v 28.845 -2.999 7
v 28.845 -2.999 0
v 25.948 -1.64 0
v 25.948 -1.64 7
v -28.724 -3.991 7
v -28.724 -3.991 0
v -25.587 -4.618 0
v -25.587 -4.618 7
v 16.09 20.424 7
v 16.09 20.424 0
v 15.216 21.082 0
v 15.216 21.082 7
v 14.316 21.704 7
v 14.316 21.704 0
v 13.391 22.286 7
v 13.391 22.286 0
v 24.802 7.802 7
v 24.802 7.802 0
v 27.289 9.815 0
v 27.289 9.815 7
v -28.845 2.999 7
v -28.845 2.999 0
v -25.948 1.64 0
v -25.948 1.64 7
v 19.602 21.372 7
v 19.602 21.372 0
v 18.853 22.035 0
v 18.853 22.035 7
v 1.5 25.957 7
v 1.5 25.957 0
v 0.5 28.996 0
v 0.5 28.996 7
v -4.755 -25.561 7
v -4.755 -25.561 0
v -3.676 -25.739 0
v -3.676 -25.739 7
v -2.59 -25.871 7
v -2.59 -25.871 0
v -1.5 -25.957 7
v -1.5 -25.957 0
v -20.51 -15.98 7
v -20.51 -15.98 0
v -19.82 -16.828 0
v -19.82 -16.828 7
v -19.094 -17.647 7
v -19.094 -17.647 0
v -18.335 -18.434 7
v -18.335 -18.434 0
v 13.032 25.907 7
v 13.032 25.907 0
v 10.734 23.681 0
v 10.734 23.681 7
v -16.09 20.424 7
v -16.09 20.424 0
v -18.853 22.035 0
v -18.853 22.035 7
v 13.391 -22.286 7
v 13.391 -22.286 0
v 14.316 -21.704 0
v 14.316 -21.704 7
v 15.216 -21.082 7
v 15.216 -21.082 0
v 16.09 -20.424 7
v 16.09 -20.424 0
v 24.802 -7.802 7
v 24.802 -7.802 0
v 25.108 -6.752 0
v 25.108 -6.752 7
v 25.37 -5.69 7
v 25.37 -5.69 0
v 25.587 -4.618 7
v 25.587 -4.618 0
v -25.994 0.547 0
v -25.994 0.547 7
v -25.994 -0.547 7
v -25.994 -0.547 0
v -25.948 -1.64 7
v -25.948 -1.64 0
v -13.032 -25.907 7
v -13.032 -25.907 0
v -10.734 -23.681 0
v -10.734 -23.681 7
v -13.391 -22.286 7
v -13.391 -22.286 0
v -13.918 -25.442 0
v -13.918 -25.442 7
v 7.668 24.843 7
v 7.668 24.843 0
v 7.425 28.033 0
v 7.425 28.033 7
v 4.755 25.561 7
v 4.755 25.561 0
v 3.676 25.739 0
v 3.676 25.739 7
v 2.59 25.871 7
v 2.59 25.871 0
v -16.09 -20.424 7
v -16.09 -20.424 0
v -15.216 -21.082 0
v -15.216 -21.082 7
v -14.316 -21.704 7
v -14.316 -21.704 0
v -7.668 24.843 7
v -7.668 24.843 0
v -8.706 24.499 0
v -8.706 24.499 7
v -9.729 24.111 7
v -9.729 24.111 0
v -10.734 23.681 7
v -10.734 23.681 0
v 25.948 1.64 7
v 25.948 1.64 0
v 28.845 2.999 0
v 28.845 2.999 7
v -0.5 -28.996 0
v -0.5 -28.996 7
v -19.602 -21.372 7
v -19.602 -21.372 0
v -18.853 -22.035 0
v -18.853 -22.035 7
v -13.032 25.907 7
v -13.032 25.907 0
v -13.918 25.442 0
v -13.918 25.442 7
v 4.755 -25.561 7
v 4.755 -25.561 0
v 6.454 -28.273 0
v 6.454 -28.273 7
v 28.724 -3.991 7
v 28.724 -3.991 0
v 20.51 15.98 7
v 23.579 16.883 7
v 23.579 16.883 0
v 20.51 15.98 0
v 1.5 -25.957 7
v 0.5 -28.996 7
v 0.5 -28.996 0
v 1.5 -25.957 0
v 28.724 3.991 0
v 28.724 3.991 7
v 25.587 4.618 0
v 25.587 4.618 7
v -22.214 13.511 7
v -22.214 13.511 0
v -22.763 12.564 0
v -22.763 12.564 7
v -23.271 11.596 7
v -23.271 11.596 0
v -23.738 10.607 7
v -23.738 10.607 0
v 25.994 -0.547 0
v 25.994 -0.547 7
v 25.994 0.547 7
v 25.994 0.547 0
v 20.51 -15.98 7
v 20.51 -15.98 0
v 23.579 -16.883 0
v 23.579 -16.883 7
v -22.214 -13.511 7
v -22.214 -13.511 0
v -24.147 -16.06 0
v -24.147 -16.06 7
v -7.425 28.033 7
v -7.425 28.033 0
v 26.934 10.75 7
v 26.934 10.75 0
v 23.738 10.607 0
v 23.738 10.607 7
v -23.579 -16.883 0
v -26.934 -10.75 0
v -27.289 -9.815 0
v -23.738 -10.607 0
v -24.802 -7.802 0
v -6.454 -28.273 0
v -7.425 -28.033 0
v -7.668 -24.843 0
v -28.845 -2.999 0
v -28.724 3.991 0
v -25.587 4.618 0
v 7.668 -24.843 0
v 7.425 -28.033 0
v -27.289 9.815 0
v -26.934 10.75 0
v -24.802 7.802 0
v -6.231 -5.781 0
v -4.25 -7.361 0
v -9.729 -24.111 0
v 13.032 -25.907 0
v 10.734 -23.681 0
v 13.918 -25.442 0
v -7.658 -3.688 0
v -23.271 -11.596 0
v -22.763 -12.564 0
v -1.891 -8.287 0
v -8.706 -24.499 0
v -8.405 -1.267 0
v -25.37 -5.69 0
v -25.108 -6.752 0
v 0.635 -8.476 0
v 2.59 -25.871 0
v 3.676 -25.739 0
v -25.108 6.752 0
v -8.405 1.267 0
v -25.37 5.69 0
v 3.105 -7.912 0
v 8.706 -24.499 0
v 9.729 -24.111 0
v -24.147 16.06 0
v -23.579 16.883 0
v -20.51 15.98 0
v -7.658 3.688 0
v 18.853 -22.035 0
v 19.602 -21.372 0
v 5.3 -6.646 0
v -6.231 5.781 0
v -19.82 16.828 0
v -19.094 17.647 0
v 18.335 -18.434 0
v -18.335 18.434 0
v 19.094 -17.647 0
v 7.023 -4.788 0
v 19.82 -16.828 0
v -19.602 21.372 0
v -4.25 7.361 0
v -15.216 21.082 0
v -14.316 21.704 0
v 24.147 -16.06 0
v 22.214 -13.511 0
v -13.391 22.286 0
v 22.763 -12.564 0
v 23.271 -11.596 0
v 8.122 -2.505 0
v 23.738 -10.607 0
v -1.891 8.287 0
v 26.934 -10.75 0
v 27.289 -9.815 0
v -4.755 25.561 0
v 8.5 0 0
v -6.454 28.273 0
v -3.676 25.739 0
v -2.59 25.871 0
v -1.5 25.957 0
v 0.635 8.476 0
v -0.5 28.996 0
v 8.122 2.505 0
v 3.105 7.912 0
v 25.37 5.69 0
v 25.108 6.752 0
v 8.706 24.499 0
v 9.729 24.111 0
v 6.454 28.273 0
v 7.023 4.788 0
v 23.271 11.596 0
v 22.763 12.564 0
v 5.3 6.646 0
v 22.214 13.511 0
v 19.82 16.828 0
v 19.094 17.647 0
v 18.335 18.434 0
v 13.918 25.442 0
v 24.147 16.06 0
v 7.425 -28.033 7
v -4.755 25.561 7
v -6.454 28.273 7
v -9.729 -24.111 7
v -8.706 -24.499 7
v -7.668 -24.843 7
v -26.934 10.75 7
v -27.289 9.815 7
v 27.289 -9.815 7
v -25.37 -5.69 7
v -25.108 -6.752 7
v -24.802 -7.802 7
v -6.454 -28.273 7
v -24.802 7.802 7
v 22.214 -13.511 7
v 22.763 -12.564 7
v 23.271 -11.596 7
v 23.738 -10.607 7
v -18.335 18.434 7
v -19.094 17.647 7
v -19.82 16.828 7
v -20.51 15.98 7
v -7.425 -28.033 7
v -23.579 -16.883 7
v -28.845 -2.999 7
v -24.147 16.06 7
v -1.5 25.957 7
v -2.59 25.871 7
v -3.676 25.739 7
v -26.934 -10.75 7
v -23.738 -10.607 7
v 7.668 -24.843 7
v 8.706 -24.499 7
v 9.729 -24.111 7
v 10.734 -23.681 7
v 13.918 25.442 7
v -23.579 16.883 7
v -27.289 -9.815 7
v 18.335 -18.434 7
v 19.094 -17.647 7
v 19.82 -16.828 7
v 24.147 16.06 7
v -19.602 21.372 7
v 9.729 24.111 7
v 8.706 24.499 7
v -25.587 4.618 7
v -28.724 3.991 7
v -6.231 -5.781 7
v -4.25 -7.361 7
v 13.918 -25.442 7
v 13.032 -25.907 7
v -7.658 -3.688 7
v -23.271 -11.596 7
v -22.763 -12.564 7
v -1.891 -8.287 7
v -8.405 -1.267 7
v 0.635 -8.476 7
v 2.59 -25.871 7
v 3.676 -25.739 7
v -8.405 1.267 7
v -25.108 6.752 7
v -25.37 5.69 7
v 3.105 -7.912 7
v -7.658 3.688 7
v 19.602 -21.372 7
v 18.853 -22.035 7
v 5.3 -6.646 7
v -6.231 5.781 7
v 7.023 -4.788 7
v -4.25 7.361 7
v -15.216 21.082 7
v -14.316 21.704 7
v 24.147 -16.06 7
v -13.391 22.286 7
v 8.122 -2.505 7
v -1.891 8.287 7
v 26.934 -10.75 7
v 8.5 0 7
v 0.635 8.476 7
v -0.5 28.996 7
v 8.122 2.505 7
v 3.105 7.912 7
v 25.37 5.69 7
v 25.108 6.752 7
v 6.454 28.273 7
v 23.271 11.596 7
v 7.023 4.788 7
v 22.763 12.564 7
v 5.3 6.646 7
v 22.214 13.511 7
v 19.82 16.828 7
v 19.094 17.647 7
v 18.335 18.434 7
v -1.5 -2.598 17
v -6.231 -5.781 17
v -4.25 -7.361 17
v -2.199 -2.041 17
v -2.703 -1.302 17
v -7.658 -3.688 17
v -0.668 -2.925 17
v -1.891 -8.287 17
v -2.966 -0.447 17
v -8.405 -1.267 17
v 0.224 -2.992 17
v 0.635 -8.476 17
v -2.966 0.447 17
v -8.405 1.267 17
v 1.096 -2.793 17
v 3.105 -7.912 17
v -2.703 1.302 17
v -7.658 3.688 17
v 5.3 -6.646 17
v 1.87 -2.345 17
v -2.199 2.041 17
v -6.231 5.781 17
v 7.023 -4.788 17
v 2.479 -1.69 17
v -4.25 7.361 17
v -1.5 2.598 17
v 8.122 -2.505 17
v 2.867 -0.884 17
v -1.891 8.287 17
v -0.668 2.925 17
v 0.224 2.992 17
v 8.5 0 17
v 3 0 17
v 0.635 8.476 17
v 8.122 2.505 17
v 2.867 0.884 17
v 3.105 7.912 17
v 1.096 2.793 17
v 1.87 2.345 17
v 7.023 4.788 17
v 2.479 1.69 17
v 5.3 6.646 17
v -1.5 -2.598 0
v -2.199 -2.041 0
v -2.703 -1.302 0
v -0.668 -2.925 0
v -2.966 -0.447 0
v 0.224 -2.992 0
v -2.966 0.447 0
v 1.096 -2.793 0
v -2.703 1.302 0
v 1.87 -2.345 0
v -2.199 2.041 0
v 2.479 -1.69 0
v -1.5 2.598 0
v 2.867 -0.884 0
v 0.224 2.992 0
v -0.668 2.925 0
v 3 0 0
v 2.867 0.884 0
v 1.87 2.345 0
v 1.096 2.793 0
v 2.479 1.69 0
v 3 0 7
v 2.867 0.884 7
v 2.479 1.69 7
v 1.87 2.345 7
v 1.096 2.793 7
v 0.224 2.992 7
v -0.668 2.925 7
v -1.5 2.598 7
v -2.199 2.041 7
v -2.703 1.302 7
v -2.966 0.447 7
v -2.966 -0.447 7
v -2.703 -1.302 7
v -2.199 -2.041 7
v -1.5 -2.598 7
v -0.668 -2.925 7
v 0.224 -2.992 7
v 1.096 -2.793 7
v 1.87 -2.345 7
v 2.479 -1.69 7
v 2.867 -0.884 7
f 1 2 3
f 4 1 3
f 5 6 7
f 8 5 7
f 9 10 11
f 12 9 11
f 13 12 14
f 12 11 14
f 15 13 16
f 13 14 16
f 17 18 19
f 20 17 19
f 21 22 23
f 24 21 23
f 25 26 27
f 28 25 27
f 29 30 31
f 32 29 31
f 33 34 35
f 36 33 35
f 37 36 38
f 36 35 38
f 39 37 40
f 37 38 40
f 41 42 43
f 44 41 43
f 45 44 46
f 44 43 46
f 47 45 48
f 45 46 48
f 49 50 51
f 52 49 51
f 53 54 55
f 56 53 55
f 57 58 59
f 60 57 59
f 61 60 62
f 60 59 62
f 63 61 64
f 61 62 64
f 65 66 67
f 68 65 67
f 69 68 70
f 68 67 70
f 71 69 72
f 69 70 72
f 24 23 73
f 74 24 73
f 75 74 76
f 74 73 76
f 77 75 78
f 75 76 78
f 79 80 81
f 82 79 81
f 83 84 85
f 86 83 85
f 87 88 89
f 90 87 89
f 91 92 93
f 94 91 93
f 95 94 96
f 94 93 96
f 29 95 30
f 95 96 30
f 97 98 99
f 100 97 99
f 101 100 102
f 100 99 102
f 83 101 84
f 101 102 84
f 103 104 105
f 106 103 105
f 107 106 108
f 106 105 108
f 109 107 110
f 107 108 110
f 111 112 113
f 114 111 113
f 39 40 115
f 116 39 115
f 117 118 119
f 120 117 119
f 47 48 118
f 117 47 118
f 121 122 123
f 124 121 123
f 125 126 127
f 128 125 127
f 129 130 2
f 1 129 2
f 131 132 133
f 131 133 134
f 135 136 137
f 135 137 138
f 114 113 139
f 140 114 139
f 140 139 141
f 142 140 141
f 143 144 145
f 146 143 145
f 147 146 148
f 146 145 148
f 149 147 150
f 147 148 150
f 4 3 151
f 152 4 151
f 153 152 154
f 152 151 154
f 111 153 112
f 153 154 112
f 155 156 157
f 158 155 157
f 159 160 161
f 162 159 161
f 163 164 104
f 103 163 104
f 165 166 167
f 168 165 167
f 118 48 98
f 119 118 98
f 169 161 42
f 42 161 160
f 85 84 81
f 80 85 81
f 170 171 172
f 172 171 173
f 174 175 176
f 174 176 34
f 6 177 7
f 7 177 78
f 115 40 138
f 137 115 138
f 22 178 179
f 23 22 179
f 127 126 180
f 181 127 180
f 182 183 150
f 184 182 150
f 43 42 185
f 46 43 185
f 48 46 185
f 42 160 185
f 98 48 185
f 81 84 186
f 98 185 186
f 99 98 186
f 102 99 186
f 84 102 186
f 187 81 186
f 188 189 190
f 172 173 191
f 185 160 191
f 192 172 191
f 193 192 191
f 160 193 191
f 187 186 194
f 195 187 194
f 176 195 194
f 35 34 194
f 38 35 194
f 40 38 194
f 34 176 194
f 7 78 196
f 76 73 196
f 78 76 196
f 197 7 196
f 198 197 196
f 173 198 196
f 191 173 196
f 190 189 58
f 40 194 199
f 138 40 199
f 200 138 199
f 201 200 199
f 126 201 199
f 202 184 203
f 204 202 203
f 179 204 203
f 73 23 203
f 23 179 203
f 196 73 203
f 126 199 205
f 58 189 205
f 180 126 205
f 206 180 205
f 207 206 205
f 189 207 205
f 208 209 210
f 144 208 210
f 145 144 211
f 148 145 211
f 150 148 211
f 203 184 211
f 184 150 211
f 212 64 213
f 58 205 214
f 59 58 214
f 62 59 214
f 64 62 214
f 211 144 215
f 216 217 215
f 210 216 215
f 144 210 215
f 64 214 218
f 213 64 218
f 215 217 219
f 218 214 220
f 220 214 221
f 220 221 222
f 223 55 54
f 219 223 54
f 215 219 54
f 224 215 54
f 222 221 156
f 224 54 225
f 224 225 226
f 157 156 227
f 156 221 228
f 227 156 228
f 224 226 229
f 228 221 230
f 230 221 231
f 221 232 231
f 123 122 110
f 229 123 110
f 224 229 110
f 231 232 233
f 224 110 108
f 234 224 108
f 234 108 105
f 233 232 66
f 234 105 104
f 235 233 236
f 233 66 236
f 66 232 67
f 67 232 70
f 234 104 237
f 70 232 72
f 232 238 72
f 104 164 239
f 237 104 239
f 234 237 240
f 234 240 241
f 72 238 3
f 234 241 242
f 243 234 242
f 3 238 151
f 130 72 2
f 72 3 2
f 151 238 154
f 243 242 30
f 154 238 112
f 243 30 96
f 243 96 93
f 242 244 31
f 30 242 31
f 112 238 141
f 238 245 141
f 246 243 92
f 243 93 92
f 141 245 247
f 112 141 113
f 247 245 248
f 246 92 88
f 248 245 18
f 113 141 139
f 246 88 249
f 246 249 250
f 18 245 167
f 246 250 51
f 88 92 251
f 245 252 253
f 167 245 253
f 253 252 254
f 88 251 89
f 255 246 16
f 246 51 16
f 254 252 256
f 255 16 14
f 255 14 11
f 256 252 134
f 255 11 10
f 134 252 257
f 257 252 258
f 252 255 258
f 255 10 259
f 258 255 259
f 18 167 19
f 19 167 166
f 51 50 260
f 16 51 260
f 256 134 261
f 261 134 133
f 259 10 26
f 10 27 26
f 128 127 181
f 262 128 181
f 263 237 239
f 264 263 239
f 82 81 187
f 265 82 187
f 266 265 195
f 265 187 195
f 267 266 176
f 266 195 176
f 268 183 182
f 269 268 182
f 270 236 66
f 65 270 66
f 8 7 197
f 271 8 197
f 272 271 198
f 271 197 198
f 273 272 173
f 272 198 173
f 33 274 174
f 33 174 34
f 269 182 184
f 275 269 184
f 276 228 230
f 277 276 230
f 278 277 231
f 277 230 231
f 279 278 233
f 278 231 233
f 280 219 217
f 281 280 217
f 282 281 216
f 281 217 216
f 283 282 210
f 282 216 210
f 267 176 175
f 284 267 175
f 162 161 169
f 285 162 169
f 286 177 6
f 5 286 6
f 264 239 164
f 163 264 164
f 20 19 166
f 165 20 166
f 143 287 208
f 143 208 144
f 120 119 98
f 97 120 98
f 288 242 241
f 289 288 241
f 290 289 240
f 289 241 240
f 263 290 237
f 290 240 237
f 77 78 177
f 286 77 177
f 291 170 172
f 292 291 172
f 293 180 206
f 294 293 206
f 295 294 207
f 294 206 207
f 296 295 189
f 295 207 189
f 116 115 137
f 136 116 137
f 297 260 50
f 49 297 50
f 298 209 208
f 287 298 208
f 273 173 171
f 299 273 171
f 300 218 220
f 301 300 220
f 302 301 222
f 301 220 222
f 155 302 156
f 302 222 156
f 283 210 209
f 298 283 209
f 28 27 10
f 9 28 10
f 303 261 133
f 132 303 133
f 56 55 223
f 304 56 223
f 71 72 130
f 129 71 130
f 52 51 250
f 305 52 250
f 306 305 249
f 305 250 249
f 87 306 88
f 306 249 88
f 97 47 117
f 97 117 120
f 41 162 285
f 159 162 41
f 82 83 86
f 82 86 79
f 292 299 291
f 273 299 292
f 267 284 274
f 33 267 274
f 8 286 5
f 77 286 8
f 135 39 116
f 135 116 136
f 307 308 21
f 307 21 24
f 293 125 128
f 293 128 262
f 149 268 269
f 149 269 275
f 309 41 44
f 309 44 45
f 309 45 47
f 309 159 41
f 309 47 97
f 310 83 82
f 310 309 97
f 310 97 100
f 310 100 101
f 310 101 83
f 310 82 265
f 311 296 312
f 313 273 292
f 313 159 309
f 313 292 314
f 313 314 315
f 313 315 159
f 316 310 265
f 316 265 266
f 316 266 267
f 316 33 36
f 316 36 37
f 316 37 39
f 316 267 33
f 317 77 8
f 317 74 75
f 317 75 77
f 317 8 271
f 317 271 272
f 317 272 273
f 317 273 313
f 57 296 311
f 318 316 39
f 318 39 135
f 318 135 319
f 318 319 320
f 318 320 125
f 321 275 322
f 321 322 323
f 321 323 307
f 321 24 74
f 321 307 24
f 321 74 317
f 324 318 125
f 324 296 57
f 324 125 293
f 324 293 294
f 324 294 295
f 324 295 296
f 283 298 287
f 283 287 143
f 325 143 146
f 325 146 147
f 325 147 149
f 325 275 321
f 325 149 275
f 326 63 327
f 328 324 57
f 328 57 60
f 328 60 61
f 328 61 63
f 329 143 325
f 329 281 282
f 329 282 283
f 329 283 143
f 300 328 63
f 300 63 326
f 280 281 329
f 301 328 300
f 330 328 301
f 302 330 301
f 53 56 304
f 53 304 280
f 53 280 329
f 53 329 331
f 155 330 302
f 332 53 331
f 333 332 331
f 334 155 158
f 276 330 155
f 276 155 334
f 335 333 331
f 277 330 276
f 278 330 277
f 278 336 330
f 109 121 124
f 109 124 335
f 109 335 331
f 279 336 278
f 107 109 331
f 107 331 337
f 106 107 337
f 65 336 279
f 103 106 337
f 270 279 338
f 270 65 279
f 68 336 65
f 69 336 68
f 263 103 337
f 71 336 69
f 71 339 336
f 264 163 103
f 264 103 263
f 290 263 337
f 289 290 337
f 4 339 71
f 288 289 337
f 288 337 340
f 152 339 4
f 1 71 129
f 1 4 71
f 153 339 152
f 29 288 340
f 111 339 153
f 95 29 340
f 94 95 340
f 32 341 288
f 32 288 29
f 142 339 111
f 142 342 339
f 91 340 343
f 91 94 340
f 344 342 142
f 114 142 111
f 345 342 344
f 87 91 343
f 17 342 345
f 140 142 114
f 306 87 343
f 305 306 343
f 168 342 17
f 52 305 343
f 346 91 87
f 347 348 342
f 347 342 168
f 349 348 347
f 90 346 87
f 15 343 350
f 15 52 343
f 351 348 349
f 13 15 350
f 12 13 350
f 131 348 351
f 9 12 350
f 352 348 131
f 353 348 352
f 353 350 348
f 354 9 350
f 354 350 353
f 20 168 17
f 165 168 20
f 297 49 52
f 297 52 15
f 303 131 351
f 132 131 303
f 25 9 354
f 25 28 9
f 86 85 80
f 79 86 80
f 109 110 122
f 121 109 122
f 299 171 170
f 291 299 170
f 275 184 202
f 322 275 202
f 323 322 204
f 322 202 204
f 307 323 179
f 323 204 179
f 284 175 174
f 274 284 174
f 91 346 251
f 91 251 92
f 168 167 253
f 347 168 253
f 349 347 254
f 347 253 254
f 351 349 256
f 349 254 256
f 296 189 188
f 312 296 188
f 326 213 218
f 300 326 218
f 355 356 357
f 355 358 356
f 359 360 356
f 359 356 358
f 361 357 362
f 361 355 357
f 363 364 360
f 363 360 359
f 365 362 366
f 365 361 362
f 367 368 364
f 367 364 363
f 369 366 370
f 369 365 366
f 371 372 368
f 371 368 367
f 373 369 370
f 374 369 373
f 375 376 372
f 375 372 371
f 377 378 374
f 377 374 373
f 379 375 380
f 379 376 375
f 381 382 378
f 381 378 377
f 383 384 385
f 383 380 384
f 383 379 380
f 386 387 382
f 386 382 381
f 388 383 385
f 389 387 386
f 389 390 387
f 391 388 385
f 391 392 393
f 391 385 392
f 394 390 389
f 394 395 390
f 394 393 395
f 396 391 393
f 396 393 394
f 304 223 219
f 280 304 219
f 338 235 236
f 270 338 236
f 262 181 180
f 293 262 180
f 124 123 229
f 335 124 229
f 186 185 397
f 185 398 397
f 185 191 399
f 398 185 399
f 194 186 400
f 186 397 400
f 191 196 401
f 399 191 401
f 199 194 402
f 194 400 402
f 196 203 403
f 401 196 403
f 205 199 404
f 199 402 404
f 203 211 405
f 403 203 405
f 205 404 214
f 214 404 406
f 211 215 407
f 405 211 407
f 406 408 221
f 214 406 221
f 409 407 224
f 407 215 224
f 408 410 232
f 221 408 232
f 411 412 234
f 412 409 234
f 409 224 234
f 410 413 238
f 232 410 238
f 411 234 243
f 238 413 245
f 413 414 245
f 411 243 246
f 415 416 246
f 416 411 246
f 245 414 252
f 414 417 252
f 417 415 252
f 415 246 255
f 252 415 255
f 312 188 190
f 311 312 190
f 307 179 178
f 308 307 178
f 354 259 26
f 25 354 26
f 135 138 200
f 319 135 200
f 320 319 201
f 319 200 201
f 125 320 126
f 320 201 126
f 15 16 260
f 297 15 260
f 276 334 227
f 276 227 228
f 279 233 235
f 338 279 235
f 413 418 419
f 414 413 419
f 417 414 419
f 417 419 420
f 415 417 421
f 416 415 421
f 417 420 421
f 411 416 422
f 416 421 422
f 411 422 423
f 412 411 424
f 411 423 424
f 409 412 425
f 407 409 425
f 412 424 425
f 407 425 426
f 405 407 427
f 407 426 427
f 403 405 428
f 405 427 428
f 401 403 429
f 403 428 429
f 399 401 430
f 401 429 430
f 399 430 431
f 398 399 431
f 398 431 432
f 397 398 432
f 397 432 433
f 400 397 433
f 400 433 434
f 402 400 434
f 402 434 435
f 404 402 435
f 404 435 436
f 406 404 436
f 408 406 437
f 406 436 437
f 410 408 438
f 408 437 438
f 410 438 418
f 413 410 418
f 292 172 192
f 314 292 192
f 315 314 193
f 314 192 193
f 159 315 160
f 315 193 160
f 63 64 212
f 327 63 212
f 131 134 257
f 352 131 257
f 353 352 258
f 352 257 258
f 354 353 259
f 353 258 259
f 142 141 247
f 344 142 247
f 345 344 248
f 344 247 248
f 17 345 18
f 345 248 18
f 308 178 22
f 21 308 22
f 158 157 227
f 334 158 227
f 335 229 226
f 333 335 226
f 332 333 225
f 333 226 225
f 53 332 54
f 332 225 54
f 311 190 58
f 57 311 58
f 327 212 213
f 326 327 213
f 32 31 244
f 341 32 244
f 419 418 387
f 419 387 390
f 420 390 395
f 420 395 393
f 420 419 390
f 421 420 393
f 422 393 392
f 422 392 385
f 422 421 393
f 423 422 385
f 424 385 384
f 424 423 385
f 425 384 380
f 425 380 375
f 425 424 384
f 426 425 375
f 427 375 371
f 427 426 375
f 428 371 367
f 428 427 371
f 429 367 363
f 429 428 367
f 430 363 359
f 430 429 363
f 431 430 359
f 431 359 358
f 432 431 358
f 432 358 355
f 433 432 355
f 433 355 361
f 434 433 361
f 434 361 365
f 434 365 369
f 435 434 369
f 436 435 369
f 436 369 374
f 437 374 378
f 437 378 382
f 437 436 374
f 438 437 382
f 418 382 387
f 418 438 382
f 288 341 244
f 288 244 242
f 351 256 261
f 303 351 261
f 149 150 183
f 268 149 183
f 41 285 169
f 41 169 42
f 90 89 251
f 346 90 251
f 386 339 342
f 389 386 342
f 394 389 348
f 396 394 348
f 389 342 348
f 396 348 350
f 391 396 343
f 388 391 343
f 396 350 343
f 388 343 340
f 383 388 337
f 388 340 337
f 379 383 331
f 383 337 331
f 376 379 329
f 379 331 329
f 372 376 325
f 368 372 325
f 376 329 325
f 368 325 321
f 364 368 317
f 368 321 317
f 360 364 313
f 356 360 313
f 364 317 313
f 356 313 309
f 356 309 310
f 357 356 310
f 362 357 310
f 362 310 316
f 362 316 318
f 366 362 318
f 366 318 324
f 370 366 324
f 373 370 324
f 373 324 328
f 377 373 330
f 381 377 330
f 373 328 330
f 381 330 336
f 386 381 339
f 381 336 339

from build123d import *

# Parameters (mm, degrees)
SKETCH1_R                = 8.5
BOSS_EXTRUDE1_DEPTH      = 7
SKETCH2_R                = 8.5
SKETCH2_R_2              = 3
BOSS_EXTRUDE2_DEPTH      = 10
BOSS_EXTRUDE2_DEPTH_BACK = 7


with BuildPart() as part:
    # Sketch1 → Boss-Extrude1 (new body)
    with BuildSketch(Plane.XY):
        with BuildLine():
            Line((6.453651746, 28.272785132), (4.75543091, 25.561413828))
            ThreePointArc((4.75543091, 25.561413828), (3.133953687, 25.810430727), (1.5, 25.956694705))
            Line((1.5, 25.956694705), (0.5, 28.995689335))
            Line((0.5, 28.995689335), (-0.5, 28.995689335))
            Line((-0.5, 28.995689335), (-1.5, 25.956694705))
            ThreePointArc((-1.5, 25.956694705), (-3.133953687, 25.810430727), (-4.75543091, 25.561413828))
            Line((-4.75543091, 25.561413828), (-6.453651746, 28.272785132))
            Line((-6.453651746, 28.272785132), (-7.424593563, 28.033469468))
            Line((-7.424593563, 28.033469468), (-7.668256362, 24.843466835))
            ThreePointArc((-7.668256362, 24.843466835), (-9.219727063, 24.31042231), (-10.734493461, 23.680596491))
            Line((-10.734493461, 23.680596491), (-13.03224071, 25.906769425))
            Line((-13.03224071, 25.906769425), (-13.917696736, 25.442046253))
            Line((-13.917696736, 25.442046253), (-13.390861537, 22.286426974))
            ThreePointArc((-13.390861537, 22.286426974), (-14.769683415, 21.397580513), (-16.08970627, 20.423548961))
            Line((-16.08970627, 20.423548961), (-18.853443215, 22.035146447))
            Line((-18.853443215, 22.035146447), (-19.601953963, 21.372023789))
            Line((-19.601953963, 21.372023789), (-18.335238514, 18.434180986))
            ThreePointArc((-18.335238514, 18.434180986), (-19.461279452, 17.241189114), (-20.509843834, 15.979559002))
            Line((-20.509843834, 15.979559002), (-23.57895213, 16.882920851))
            Line((-23.57895213, 16.882920851), (-24.147016876, 16.059936985))
            Line((-24.147016876, 16.059936985), (-22.214038074, 13.510607405))
            ThreePointArc((-22.214038074, 13.510607405), (-23.021856667, 12.082802473), (-23.738023825, 10.606895158))
            Line((-23.738023825, 10.606895158), (-26.934138052, 10.749521263))
            Line((-26.934138052, 10.749521263), (-27.288742939, 9.81450502))
            Line((-27.288742939, 9.81450502), (-24.801838486, 7.80184643))
            ThreePointArc((-24.801838486, 7.80184643), (-25.244487253, 6.222207271), (-25.586636155, 4.617797121))
            Line((-25.586636155, 4.617797121), (-28.724009773, 3.991398571))
            Line((-28.724009773, 3.991398571), (-28.844546453, 2.998689697))
            Line((-28.844546453, 2.998689697), (-25.948246196, 1.639670499))
            ThreePointArc((-25.948246196, 1.639670499), (-26, 0), (-25.948246196, -1.639670499))
            Line((-25.948246196, -1.639670499), (-28.844546453, -2.998689697))
            Line((-28.844546453, -2.998689697), (-28.724009773, -3.991398571))
            Line((-28.724009773, -3.991398571), (-25.586636155, -4.617797121))
            ThreePointArc((-25.586636155, -4.617797121), (-25.244487253, -6.222207271), (-24.801838486, -7.80184643))
            Line((-24.801838486, -7.80184643), (-27.288742939, -9.81450502))
            Line((-27.288742939, -9.81450502), (-26.934138052, -10.749521263))
            Line((-26.934138052, -10.749521263), (-23.738023825, -10.606895158))
            ThreePointArc((-23.738023825, -10.606895158), (-23.021856667, -12.082802473), (-22.214038074, -13.510607405))
            Line((-22.214038074, -13.510607405), (-24.147016876, -16.059936985))
            Line((-24.147016876, -16.059936985), (-23.57895213, -16.882920851))
            Line((-23.57895213, -16.882920851), (-20.509843834, -15.979559002))
            ThreePointArc((-20.509843834, -15.979559002), (-19.461279452, -17.241189114), (-18.335238514, -18.434180986))
            Line((-18.335238514, -18.434180986), (-19.601953963, -21.372023789))
            Line((-19.601953963, -21.372023789), (-18.853443215, -22.035146447))
            Line((-18.853443215, -22.035146447), (-16.08970627, -20.423548961))
            ThreePointArc((-16.08970627, -20.423548961), (-14.769683415, -21.397580513), (-13.390861537, -22.286426974))
            Line((-13.390861537, -22.286426974), (-13.917696736, -25.442046253))
            Line((-13.917696736, -25.442046253), (-13.03224071, -25.906769425))
            Line((-13.03224071, -25.906769425), (-10.734493461, -23.680596491))
            ThreePointArc((-10.734493461, -23.680596491), (-9.219727063, -24.31042231), (-7.668256362, -24.843466835))
            Line((-7.668256362, -24.843466835), (-7.424593563, -28.033469468))
            Line((-7.424593563, -28.033469468), (-6.453651746, -28.272785132))
            Line((-6.453651746, -28.272785132), (-4.75543091, -25.561413828))
            ThreePointArc((-4.75543091, -25.561413828), (-3.133953687, -25.810430727), (-1.5, -25.956694705))
            Line((-1.5, -25.956694705), (-0.5, -28.995689335))
            Line((-0.5, -28.995689335), (0.5, -28.995689335))
            Line((0.5, -28.995689335), (1.5, -25.956694705))
            ThreePointArc((1.5, -25.956694705), (3.133953687, -25.810430727), (4.75543091, -25.561413828))
            Line((4.75543091, -25.561413828), (6.453651746, -28.272785132))
            Line((6.453651746, -28.272785132), (7.424593563, -28.033469468))
            Line((7.424593563, -28.033469468), (7.668256362, -24.843466835))
            ThreePointArc((7.668256362, -24.843466835), (9.219727063, -24.31042231), (10.734493461, -23.680596491))
            Line((10.734493461, -23.680596491), (13.03224071, -25.906769425))
            Line((13.03224071, -25.906769425), (13.917696736, -25.442046253))
            Line((13.917696736, -25.442046253), (13.390861537, -22.286426974))
            ThreePointArc((13.390861537, -22.286426974), (14.769683415, -21.397580513), (16.08970627, -20.423548961))
            Line((16.08970627, -20.423548961), (18.853443215, -22.035146447))
            Line((18.853443215, -22.035146447), (19.601953963, -21.372023789))
            Line((19.601953963, -21.372023789), (18.335238514, -18.434180986))
            ThreePointArc((18.335238514, -18.434180986), (19.461279452, -17.241189114), (20.509843834, -15.979559002))
            Line((20.509843834, -15.979559002), (23.57895213, -16.882920851))
            Line((23.57895213, -16.882920851), (24.147016876, -16.059936985))
            Line((24.147016876, -16.059936985), (22.214038074, -13.510607405))
            ThreePointArc((22.214038074, -13.510607405), (23.021856667, -12.082802473), (23.738023825, -10.606895158))
            Line((23.738023825, -10.606895158), (26.934138052, -10.749521263))
            Line((26.934138052, -10.749521263), (27.288742939, -9.81450502))
            Line((27.288742939, -9.81450502), (24.801838486, -7.80184643))
            ThreePointArc((24.801838486, -7.80184643), (25.244487253, -6.222207271), (25.586636155, -4.617797121))
            Line((25.586636155, -4.617797121), (28.724009773, -3.991398571))
            Line((28.724009773, -3.991398571), (28.844546453, -2.998689697))
            Line((28.844546453, -2.998689697), (25.948246196, -1.639670499))
            ThreePointArc((25.948246196, -1.639670499), (26, 0), (25.948246196, 1.639670499))
            Line((25.948246196, 1.639670499), (28.844546453, 2.998689697))
            Line((28.844546453, 2.998689697), (28.724009773, 3.991398571))
            Line((28.724009773, 3.991398571), (25.586636155, 4.617797121))
            ThreePointArc((25.586636155, 4.617797121), (25.244487253, 6.222207271), (24.801838486, 7.80184643))
            Line((24.801838486, 7.80184643), (27.288742939, 9.81450502))
            Line((27.288742939, 9.81450502), (26.934138052, 10.749521263))
            Line((26.934138052, 10.749521263), (23.738023825, 10.606895158))
            ThreePointArc((23.738023825, 10.606895158), (23.021856667, 12.082802473), (22.214038074, 13.510607405))
            Line((22.214038074, 13.510607405), (24.147016876, 16.059936985))
            Line((24.147016876, 16.059936985), (23.57895213, 16.882920851))
            Line((23.57895213, 16.882920851), (20.509843834, 15.979559002))
            ThreePointArc((20.509843834, 15.979559002), (19.461279452, 17.241189114), (18.335238514, 18.434180986))
            Line((18.335238514, 18.434180986), (19.601953963, 21.372023789))
            Line((19.601953963, 21.372023789), (18.853443215, 22.035146447))
            Line((18.853443215, 22.035146447), (16.08970627, 20.423548961))
            ThreePointArc((16.08970627, 20.423548961), (14.769683415, 21.397580513), (13.390861537, 22.286426974))
            Line((13.390861537, 22.286426974), (13.917696736, 25.442046253))
            Line((13.917696736, 25.442046253), (13.03224071, 25.906769425))
            Line((13.03224071, 25.906769425), (10.734493461, 23.680596491))
            ThreePointArc((10.734493461, 23.680596491), (9.219727063, 24.31042231), (7.668256362, 24.843466835))
            Line((7.668256362, 24.843466835), (7.424593563, 28.033469468))
            Line((7.424593563, 28.033469468), (6.453651746, 28.272785132))
        make_face()
        Circle(SKETCH1_R, mode=Mode.SUBTRACT)
    extrude(amount=BOSS_EXTRUDE1_DEPTH)

    # Sketch2 → Boss-Extrude2 (add, two sides)
    with BuildSketch(Plane.XY.offset(7)) as boss_extrude2_sk:
        Circle(SKETCH2_R)
        Circle(SKETCH2_R_2, mode=Mode.SUBTRACT)
    extrude(amount=BOSS_EXTRUDE2_DEPTH)
    extrude(boss_extrude2_sk.sketch, amount=-BOSS_EXTRUDE2_DEPTH_BACK)


solid = part.part
